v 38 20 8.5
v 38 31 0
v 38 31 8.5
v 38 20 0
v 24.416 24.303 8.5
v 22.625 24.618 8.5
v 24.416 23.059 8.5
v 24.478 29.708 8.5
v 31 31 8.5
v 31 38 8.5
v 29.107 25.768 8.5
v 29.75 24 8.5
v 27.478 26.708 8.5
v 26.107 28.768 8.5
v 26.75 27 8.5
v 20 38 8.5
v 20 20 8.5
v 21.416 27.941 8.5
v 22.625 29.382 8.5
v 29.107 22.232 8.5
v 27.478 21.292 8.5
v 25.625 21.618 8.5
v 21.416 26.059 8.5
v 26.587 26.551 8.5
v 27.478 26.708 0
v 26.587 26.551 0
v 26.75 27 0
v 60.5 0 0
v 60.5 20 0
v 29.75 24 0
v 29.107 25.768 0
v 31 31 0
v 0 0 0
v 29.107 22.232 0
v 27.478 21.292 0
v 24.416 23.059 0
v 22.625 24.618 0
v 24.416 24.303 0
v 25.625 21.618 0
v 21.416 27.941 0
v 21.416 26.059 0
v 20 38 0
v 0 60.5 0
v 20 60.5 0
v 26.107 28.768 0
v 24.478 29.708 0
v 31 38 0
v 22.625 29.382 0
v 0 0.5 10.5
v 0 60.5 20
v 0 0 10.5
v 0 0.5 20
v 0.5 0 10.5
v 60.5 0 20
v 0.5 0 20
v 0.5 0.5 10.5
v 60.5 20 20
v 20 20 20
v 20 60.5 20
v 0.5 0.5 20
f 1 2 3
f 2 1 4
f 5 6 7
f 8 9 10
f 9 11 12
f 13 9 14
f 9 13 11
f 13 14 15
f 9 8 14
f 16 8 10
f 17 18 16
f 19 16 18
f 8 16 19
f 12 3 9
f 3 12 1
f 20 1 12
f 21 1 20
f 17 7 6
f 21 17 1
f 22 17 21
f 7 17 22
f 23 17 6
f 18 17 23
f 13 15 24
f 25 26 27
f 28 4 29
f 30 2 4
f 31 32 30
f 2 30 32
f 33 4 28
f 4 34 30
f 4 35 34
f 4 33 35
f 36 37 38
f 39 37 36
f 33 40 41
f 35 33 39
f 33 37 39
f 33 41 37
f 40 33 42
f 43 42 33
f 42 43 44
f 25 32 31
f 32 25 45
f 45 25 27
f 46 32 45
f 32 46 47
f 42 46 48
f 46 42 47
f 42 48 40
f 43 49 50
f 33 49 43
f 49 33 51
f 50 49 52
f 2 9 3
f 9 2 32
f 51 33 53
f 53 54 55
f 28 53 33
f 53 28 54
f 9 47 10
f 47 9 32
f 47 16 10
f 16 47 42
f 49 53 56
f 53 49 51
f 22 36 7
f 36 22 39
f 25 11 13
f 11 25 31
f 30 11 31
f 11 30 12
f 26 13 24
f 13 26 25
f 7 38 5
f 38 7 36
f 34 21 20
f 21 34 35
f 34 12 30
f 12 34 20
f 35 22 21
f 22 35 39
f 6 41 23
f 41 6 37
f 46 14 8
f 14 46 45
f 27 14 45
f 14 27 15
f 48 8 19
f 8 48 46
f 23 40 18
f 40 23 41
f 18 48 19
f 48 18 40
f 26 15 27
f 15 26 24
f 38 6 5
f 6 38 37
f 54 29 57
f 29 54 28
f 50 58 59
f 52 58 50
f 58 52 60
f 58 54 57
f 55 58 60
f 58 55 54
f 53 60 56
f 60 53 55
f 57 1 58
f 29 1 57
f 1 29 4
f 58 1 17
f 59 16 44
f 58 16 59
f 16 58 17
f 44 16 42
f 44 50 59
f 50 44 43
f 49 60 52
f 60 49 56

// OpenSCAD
// Parameters
overall_length = 38; //[19:76:0.5]
overall_width = 31; //[15.5:62:0.5]
overall_thickness = 8.5; //[4.25:17:0.25]
base_plate_length = 38; //[19:76:0.5]
base_plate_width = 31; //[15.5:62:0.5]
gusset_thickness = 4; //[2:8:0.5]
gusset_leg_x = 26; //[13:52:0.5]
gusset_leg_y = 22; //[11:44:0.5]
hole_diameter = 5.5; //[3:8:0.1]
hole_offset_from_corner = 15; //[8:30:0.5]
hole_spacing_along_leg = 12; //[6:24:0.5]
hole_edge_margin = 7; //[4:14:0.5]
overlap = 1; //[0.5:2:0.1]
extrusion_size = 20; //[10:40:1]
extrusion_length = 60; //[30:120:1]
assembly_gap = 0.5; //[0:2:0.1]

// Extrusion - complete geometry
module extrusion() {
  color([0.85, 0.85, 0.8]) {
    union() {
      translate([extrusion_length/2 + assembly_gap, extrusion_size/2, extrusion_size/2])
        cube([extrusion_length, extrusion_size, extrusion_size], center=true);
      translate([extrusion_size/2, extrusion_length/2 + assembly_gap, extrusion_size/2])
        cube([extrusion_size, extrusion_length, extrusion_size], center=true);
    }
  }
}

// Extrusion Corner Bracket Hole Positions - complete geometry
module extrusion_corner_bracket_hole_positions() {
  color("Silver") {
    union() {
      translate([hole_offset_from_corner, base_plate_width - hole_edge_margin, overall_thickness/2])
        cylinder(r=hole_diameter/2, h=overall_thickness + 2*overlap, center=true);
      translate([hole_offset_from_corner + hole_spacing_along_leg, base_plate_width - hole_edge_margin, overall_thickness/2])
        cylinder(r=hole_diameter/2, h=overall_thickness + 2*overlap, center=true);
      translate([base_plate_width - hole_edge_margin, hole_offset_from_corner, overall_thickness/2])
        cylinder(r=hole_diameter/2, h=overall_thickness + 2*overlap, center=true);
      translate([base_plate_width - hole_edge_margin, hole_offset_from_corner + hole_spacing_along_leg, overall_thickness/2])
        cylinder(r=hole_diameter/2, h=overall_thickness + 2*overlap, center=true);
    }
  }
}

// Extrusion Corner Bracket - complete geometry
module extrusion_corner_bracket() {
  color("Silver") {
    union() {
      translate([base_plate_length/2, base_plate_width/2, overall_thickness/2])
        cube([base_plate_length, base_plate_width, overall_thickness], center=true);
      translate([base_plate_width/2, base_plate_length/2, overall_thickness/2])
        cube([base_plate_width, base_plate_length, overall_thickness], center=true);
      translate([0, 0, gusset_thickness/2])
        linear_extrude(height=gusset_thickness)
          polygon(points=[[0, 0], [gusset_leg_x, 0], [0, gusset_leg_y]]);
      translate([0, 0, overall_thickness - gusset_thickness/2])
        linear_extrude(height=gusset_thickness)
          polygon(points=[[0, 0], [gusset_leg_x, 0], [0, gusset_leg_y]]);
    }
  }
}

// Extrusion Corner Bracket 3D - complete geometry
module extrusion_corner_bracket_3D() {
  difference() {
    extrusion_corner_bracket();
    extrusion_corner_bracket_hole_positions();
  }
}

// Extrusion Corner Bracket Assembly - complete geometry
module extrusion_corner_bracket_assembly() {
  union() {
    extrusion_corner_bracket_3D();
    extrusion();
  }
}

// Assembly
module assembly() {
  extrusion_corner_bracket_assembly();
}

assembly();
